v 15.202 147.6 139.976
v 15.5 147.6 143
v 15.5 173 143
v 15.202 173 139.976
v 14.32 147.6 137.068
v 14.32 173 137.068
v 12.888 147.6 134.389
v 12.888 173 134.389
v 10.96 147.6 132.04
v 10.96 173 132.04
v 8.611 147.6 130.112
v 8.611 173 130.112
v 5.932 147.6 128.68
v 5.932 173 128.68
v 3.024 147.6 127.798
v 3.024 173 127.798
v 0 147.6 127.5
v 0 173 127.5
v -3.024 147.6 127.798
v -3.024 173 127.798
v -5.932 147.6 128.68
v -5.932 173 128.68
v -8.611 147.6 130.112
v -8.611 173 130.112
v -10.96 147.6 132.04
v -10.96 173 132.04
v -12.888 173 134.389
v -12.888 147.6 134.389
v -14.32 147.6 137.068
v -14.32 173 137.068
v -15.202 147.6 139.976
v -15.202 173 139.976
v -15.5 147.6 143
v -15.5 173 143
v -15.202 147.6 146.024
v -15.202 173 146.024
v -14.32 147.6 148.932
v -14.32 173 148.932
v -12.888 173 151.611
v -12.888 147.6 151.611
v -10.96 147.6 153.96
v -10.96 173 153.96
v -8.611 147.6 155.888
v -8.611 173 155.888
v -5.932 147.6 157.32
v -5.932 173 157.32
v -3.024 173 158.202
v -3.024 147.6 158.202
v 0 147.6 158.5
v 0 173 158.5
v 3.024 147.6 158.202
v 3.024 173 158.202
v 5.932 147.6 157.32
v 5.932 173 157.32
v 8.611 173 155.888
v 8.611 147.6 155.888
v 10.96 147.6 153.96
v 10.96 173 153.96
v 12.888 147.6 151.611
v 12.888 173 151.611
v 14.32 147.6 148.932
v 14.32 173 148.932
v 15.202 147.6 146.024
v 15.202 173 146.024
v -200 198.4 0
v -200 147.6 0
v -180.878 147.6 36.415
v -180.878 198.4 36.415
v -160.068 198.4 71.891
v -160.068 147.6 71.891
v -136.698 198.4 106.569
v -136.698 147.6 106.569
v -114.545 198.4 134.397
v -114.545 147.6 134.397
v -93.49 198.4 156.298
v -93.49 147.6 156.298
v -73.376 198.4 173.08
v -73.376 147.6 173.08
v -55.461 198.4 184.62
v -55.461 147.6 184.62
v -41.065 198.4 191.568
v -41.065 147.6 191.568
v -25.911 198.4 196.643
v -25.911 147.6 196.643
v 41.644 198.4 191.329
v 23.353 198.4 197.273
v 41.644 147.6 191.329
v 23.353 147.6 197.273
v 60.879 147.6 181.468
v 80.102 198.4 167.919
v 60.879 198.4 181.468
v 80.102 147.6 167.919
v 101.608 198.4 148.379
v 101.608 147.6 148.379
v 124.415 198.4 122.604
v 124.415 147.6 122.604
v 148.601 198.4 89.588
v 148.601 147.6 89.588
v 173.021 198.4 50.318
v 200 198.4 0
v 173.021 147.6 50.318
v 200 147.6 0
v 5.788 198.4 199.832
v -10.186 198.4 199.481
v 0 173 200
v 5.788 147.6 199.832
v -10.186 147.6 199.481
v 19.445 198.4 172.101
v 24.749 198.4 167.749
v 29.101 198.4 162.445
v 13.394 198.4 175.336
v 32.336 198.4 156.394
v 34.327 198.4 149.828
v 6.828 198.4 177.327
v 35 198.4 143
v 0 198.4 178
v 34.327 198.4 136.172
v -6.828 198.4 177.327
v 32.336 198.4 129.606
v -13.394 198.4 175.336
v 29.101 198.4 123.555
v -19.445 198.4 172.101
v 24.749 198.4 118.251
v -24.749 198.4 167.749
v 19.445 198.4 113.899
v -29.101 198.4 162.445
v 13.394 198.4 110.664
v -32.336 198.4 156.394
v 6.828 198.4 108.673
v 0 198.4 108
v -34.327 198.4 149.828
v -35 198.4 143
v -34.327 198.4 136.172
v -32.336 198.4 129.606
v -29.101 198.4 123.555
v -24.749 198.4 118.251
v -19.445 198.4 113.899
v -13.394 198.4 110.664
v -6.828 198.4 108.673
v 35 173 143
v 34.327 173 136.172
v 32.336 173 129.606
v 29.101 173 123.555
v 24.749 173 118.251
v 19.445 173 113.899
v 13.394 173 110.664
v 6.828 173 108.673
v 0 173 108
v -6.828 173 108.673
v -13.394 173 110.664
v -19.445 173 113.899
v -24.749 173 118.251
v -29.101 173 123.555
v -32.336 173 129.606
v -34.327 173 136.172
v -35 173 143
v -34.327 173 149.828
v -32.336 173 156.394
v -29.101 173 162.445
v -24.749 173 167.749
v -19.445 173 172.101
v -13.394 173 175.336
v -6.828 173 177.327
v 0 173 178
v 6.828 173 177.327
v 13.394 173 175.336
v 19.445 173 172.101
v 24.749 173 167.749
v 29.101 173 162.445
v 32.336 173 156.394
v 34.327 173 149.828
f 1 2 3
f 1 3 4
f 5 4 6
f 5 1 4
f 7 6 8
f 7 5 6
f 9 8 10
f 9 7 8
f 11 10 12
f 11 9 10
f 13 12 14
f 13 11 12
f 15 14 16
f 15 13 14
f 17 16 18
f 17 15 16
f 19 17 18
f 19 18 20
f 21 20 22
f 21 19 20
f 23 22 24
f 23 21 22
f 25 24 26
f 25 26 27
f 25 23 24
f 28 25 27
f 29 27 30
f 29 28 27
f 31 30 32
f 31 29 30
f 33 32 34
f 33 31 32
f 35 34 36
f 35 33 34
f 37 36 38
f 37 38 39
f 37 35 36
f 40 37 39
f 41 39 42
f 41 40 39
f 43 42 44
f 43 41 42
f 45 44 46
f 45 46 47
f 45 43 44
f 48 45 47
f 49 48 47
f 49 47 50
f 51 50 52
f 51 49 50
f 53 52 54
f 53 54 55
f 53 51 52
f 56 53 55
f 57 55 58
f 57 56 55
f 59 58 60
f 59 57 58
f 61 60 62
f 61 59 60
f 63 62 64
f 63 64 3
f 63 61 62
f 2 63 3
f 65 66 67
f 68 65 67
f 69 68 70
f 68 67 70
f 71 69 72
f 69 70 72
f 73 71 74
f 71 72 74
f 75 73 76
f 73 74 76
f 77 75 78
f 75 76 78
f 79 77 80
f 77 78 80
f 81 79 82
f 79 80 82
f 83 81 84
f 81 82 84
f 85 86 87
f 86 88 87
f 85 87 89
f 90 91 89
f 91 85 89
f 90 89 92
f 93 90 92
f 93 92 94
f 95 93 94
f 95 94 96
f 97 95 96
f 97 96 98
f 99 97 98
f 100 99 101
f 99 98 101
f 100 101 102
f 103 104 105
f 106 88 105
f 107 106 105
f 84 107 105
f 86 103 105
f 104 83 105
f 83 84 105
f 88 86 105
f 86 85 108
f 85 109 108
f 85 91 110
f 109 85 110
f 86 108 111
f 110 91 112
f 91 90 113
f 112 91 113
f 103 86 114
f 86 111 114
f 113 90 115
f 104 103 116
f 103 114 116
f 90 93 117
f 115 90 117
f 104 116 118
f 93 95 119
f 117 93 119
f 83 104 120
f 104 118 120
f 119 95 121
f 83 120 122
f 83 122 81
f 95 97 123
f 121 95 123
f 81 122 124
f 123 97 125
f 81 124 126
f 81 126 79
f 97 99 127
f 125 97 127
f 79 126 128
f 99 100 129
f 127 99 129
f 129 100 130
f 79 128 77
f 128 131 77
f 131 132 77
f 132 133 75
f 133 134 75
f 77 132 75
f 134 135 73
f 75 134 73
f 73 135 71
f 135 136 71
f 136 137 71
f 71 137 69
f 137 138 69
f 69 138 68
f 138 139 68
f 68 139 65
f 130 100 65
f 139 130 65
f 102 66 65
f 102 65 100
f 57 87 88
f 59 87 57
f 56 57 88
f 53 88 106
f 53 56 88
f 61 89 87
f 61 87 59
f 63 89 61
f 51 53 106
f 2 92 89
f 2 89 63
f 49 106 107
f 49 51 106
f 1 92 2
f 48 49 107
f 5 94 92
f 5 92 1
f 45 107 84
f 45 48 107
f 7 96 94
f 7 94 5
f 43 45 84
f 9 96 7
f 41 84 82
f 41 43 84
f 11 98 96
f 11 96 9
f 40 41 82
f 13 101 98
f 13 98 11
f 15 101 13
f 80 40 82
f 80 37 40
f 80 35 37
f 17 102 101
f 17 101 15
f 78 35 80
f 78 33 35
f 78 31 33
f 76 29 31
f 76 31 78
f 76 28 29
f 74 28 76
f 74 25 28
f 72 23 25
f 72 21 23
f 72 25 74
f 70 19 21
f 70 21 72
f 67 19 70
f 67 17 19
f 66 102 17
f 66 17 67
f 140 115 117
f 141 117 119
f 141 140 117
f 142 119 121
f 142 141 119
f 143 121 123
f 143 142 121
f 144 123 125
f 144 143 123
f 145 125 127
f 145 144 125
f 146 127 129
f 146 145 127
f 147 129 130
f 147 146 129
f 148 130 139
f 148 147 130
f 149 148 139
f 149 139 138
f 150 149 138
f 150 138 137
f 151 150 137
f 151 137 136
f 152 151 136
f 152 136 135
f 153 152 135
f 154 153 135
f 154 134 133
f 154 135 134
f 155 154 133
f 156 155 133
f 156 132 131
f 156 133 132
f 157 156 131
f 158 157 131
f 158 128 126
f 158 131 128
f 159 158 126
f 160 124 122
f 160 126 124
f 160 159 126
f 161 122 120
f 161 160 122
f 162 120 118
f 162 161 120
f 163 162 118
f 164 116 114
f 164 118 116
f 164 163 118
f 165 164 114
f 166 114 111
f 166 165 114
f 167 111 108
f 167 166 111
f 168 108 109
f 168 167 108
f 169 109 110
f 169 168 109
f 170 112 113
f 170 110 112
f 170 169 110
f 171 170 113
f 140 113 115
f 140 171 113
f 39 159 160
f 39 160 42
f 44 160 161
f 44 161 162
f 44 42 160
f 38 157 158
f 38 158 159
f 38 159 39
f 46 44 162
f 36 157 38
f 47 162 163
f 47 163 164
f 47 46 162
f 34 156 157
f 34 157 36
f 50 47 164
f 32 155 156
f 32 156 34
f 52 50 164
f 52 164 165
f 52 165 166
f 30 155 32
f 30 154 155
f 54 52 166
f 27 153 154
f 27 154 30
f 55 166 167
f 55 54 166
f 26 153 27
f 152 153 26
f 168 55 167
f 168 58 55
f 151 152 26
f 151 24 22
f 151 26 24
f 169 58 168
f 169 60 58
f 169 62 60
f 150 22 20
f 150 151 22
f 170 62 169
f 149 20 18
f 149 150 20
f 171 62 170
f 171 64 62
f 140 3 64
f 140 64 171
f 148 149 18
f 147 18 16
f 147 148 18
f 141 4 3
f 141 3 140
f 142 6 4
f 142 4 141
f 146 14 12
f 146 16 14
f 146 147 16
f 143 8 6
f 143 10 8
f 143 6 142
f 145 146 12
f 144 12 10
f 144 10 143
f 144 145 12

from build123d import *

# Parameters (mm, degrees)
BOSS_EXTRUDE1_DEPTH     = 300
SKETCH3_R               = 15.5
CUT_EXTRUDE1_DEPTH      = 23
CUT_EXTRUDE1_DEPTH_BACK = 23
SKETCH4_R               = 35
CUT_EXTRUDE3_DEPTH      = 300
SKETCH5_W               = 541.558659161
SKETCH5_H               = 211.066516127
SKETCH5_W_2             = 529.372370701
SKETCH5_H_2             = 106.264435371
CUT_EXTRUDE4_DEPTH      = 201.0000001


with BuildPart() as part:
    # Sketch1 → Boss-Extrude1 (new body)
    with BuildSketch(Plane(origin=(0, 0, 0), x_dir=(1, 0, 0), z_dir=(0, 1, 0))):
        with BuildLine():
            Line((-200, 1e-09), (200, 1e-09))
            add(Edge.make_bspline(
                [(-200, 1e-09), (0, -400.000000001), (200, 1e-09)],
                knots=[0.056028396, 0.056028396, 0.056028396, 0.943971604, 0.943971604, 0.943971604], degree=2))
        make_face()
    extrude(amount=BOSS_EXTRUDE1_DEPTH)

    # Sketch3 → Cut-Extrude1 (cut, two sides)
    with BuildSketch(Plane(origin=(0, 150, 0), x_dir=(1, 0, 0), z_dir=(0, 1, 0))) as cut_extrude1_sk:
        with Locations((0, -142.999999999)):
            Circle(SKETCH3_R)
    extrude(amount=CUT_EXTRUDE1_DEPTH, mode=Mode.SUBTRACT)
    extrude(cut_extrude1_sk.sketch, amount=-CUT_EXTRUDE1_DEPTH_BACK, mode=Mode.SUBTRACT)

    # Sketch4 → Cut-Extrude3 (cut)
    with BuildSketch(Plane(origin=(0, 173, 0), x_dir=(1, 0, 0), z_dir=(0, 1, 0))):
        with Locations((0, -142.999999999)):
            Circle(SKETCH4_R)
    cut_extrude3 = extrude(amount=CUT_EXTRUDE3_DEPTH, mode=Mode.SUBTRACT)

    # Mirror1: Cut-Extrude3 across plane
    add(cut_extrude3.mirror(Plane.ZX.offset(150)), mode=Mode.SUBTRACT)

    # Sketch5 → Cut-Extrude4 (cut, through all)
    with BuildSketch(Plane(origin=(0, 0, 0), x_dir=(-1, 0, 0), z_dir=(0, 0, -1))):
        with Locations((21.44786769, 42.066741937)):
            Rectangle(SKETCH5_W, SKETCH5_H)
        with Locations((2.680983461, 251.532217686)):
            Rectangle(SKETCH5_W_2, SKETCH5_H_2)
    extrude(amount=-CUT_EXTRUDE4_DEPTH, mode=Mode.SUBTRACT)


solid = part.part
